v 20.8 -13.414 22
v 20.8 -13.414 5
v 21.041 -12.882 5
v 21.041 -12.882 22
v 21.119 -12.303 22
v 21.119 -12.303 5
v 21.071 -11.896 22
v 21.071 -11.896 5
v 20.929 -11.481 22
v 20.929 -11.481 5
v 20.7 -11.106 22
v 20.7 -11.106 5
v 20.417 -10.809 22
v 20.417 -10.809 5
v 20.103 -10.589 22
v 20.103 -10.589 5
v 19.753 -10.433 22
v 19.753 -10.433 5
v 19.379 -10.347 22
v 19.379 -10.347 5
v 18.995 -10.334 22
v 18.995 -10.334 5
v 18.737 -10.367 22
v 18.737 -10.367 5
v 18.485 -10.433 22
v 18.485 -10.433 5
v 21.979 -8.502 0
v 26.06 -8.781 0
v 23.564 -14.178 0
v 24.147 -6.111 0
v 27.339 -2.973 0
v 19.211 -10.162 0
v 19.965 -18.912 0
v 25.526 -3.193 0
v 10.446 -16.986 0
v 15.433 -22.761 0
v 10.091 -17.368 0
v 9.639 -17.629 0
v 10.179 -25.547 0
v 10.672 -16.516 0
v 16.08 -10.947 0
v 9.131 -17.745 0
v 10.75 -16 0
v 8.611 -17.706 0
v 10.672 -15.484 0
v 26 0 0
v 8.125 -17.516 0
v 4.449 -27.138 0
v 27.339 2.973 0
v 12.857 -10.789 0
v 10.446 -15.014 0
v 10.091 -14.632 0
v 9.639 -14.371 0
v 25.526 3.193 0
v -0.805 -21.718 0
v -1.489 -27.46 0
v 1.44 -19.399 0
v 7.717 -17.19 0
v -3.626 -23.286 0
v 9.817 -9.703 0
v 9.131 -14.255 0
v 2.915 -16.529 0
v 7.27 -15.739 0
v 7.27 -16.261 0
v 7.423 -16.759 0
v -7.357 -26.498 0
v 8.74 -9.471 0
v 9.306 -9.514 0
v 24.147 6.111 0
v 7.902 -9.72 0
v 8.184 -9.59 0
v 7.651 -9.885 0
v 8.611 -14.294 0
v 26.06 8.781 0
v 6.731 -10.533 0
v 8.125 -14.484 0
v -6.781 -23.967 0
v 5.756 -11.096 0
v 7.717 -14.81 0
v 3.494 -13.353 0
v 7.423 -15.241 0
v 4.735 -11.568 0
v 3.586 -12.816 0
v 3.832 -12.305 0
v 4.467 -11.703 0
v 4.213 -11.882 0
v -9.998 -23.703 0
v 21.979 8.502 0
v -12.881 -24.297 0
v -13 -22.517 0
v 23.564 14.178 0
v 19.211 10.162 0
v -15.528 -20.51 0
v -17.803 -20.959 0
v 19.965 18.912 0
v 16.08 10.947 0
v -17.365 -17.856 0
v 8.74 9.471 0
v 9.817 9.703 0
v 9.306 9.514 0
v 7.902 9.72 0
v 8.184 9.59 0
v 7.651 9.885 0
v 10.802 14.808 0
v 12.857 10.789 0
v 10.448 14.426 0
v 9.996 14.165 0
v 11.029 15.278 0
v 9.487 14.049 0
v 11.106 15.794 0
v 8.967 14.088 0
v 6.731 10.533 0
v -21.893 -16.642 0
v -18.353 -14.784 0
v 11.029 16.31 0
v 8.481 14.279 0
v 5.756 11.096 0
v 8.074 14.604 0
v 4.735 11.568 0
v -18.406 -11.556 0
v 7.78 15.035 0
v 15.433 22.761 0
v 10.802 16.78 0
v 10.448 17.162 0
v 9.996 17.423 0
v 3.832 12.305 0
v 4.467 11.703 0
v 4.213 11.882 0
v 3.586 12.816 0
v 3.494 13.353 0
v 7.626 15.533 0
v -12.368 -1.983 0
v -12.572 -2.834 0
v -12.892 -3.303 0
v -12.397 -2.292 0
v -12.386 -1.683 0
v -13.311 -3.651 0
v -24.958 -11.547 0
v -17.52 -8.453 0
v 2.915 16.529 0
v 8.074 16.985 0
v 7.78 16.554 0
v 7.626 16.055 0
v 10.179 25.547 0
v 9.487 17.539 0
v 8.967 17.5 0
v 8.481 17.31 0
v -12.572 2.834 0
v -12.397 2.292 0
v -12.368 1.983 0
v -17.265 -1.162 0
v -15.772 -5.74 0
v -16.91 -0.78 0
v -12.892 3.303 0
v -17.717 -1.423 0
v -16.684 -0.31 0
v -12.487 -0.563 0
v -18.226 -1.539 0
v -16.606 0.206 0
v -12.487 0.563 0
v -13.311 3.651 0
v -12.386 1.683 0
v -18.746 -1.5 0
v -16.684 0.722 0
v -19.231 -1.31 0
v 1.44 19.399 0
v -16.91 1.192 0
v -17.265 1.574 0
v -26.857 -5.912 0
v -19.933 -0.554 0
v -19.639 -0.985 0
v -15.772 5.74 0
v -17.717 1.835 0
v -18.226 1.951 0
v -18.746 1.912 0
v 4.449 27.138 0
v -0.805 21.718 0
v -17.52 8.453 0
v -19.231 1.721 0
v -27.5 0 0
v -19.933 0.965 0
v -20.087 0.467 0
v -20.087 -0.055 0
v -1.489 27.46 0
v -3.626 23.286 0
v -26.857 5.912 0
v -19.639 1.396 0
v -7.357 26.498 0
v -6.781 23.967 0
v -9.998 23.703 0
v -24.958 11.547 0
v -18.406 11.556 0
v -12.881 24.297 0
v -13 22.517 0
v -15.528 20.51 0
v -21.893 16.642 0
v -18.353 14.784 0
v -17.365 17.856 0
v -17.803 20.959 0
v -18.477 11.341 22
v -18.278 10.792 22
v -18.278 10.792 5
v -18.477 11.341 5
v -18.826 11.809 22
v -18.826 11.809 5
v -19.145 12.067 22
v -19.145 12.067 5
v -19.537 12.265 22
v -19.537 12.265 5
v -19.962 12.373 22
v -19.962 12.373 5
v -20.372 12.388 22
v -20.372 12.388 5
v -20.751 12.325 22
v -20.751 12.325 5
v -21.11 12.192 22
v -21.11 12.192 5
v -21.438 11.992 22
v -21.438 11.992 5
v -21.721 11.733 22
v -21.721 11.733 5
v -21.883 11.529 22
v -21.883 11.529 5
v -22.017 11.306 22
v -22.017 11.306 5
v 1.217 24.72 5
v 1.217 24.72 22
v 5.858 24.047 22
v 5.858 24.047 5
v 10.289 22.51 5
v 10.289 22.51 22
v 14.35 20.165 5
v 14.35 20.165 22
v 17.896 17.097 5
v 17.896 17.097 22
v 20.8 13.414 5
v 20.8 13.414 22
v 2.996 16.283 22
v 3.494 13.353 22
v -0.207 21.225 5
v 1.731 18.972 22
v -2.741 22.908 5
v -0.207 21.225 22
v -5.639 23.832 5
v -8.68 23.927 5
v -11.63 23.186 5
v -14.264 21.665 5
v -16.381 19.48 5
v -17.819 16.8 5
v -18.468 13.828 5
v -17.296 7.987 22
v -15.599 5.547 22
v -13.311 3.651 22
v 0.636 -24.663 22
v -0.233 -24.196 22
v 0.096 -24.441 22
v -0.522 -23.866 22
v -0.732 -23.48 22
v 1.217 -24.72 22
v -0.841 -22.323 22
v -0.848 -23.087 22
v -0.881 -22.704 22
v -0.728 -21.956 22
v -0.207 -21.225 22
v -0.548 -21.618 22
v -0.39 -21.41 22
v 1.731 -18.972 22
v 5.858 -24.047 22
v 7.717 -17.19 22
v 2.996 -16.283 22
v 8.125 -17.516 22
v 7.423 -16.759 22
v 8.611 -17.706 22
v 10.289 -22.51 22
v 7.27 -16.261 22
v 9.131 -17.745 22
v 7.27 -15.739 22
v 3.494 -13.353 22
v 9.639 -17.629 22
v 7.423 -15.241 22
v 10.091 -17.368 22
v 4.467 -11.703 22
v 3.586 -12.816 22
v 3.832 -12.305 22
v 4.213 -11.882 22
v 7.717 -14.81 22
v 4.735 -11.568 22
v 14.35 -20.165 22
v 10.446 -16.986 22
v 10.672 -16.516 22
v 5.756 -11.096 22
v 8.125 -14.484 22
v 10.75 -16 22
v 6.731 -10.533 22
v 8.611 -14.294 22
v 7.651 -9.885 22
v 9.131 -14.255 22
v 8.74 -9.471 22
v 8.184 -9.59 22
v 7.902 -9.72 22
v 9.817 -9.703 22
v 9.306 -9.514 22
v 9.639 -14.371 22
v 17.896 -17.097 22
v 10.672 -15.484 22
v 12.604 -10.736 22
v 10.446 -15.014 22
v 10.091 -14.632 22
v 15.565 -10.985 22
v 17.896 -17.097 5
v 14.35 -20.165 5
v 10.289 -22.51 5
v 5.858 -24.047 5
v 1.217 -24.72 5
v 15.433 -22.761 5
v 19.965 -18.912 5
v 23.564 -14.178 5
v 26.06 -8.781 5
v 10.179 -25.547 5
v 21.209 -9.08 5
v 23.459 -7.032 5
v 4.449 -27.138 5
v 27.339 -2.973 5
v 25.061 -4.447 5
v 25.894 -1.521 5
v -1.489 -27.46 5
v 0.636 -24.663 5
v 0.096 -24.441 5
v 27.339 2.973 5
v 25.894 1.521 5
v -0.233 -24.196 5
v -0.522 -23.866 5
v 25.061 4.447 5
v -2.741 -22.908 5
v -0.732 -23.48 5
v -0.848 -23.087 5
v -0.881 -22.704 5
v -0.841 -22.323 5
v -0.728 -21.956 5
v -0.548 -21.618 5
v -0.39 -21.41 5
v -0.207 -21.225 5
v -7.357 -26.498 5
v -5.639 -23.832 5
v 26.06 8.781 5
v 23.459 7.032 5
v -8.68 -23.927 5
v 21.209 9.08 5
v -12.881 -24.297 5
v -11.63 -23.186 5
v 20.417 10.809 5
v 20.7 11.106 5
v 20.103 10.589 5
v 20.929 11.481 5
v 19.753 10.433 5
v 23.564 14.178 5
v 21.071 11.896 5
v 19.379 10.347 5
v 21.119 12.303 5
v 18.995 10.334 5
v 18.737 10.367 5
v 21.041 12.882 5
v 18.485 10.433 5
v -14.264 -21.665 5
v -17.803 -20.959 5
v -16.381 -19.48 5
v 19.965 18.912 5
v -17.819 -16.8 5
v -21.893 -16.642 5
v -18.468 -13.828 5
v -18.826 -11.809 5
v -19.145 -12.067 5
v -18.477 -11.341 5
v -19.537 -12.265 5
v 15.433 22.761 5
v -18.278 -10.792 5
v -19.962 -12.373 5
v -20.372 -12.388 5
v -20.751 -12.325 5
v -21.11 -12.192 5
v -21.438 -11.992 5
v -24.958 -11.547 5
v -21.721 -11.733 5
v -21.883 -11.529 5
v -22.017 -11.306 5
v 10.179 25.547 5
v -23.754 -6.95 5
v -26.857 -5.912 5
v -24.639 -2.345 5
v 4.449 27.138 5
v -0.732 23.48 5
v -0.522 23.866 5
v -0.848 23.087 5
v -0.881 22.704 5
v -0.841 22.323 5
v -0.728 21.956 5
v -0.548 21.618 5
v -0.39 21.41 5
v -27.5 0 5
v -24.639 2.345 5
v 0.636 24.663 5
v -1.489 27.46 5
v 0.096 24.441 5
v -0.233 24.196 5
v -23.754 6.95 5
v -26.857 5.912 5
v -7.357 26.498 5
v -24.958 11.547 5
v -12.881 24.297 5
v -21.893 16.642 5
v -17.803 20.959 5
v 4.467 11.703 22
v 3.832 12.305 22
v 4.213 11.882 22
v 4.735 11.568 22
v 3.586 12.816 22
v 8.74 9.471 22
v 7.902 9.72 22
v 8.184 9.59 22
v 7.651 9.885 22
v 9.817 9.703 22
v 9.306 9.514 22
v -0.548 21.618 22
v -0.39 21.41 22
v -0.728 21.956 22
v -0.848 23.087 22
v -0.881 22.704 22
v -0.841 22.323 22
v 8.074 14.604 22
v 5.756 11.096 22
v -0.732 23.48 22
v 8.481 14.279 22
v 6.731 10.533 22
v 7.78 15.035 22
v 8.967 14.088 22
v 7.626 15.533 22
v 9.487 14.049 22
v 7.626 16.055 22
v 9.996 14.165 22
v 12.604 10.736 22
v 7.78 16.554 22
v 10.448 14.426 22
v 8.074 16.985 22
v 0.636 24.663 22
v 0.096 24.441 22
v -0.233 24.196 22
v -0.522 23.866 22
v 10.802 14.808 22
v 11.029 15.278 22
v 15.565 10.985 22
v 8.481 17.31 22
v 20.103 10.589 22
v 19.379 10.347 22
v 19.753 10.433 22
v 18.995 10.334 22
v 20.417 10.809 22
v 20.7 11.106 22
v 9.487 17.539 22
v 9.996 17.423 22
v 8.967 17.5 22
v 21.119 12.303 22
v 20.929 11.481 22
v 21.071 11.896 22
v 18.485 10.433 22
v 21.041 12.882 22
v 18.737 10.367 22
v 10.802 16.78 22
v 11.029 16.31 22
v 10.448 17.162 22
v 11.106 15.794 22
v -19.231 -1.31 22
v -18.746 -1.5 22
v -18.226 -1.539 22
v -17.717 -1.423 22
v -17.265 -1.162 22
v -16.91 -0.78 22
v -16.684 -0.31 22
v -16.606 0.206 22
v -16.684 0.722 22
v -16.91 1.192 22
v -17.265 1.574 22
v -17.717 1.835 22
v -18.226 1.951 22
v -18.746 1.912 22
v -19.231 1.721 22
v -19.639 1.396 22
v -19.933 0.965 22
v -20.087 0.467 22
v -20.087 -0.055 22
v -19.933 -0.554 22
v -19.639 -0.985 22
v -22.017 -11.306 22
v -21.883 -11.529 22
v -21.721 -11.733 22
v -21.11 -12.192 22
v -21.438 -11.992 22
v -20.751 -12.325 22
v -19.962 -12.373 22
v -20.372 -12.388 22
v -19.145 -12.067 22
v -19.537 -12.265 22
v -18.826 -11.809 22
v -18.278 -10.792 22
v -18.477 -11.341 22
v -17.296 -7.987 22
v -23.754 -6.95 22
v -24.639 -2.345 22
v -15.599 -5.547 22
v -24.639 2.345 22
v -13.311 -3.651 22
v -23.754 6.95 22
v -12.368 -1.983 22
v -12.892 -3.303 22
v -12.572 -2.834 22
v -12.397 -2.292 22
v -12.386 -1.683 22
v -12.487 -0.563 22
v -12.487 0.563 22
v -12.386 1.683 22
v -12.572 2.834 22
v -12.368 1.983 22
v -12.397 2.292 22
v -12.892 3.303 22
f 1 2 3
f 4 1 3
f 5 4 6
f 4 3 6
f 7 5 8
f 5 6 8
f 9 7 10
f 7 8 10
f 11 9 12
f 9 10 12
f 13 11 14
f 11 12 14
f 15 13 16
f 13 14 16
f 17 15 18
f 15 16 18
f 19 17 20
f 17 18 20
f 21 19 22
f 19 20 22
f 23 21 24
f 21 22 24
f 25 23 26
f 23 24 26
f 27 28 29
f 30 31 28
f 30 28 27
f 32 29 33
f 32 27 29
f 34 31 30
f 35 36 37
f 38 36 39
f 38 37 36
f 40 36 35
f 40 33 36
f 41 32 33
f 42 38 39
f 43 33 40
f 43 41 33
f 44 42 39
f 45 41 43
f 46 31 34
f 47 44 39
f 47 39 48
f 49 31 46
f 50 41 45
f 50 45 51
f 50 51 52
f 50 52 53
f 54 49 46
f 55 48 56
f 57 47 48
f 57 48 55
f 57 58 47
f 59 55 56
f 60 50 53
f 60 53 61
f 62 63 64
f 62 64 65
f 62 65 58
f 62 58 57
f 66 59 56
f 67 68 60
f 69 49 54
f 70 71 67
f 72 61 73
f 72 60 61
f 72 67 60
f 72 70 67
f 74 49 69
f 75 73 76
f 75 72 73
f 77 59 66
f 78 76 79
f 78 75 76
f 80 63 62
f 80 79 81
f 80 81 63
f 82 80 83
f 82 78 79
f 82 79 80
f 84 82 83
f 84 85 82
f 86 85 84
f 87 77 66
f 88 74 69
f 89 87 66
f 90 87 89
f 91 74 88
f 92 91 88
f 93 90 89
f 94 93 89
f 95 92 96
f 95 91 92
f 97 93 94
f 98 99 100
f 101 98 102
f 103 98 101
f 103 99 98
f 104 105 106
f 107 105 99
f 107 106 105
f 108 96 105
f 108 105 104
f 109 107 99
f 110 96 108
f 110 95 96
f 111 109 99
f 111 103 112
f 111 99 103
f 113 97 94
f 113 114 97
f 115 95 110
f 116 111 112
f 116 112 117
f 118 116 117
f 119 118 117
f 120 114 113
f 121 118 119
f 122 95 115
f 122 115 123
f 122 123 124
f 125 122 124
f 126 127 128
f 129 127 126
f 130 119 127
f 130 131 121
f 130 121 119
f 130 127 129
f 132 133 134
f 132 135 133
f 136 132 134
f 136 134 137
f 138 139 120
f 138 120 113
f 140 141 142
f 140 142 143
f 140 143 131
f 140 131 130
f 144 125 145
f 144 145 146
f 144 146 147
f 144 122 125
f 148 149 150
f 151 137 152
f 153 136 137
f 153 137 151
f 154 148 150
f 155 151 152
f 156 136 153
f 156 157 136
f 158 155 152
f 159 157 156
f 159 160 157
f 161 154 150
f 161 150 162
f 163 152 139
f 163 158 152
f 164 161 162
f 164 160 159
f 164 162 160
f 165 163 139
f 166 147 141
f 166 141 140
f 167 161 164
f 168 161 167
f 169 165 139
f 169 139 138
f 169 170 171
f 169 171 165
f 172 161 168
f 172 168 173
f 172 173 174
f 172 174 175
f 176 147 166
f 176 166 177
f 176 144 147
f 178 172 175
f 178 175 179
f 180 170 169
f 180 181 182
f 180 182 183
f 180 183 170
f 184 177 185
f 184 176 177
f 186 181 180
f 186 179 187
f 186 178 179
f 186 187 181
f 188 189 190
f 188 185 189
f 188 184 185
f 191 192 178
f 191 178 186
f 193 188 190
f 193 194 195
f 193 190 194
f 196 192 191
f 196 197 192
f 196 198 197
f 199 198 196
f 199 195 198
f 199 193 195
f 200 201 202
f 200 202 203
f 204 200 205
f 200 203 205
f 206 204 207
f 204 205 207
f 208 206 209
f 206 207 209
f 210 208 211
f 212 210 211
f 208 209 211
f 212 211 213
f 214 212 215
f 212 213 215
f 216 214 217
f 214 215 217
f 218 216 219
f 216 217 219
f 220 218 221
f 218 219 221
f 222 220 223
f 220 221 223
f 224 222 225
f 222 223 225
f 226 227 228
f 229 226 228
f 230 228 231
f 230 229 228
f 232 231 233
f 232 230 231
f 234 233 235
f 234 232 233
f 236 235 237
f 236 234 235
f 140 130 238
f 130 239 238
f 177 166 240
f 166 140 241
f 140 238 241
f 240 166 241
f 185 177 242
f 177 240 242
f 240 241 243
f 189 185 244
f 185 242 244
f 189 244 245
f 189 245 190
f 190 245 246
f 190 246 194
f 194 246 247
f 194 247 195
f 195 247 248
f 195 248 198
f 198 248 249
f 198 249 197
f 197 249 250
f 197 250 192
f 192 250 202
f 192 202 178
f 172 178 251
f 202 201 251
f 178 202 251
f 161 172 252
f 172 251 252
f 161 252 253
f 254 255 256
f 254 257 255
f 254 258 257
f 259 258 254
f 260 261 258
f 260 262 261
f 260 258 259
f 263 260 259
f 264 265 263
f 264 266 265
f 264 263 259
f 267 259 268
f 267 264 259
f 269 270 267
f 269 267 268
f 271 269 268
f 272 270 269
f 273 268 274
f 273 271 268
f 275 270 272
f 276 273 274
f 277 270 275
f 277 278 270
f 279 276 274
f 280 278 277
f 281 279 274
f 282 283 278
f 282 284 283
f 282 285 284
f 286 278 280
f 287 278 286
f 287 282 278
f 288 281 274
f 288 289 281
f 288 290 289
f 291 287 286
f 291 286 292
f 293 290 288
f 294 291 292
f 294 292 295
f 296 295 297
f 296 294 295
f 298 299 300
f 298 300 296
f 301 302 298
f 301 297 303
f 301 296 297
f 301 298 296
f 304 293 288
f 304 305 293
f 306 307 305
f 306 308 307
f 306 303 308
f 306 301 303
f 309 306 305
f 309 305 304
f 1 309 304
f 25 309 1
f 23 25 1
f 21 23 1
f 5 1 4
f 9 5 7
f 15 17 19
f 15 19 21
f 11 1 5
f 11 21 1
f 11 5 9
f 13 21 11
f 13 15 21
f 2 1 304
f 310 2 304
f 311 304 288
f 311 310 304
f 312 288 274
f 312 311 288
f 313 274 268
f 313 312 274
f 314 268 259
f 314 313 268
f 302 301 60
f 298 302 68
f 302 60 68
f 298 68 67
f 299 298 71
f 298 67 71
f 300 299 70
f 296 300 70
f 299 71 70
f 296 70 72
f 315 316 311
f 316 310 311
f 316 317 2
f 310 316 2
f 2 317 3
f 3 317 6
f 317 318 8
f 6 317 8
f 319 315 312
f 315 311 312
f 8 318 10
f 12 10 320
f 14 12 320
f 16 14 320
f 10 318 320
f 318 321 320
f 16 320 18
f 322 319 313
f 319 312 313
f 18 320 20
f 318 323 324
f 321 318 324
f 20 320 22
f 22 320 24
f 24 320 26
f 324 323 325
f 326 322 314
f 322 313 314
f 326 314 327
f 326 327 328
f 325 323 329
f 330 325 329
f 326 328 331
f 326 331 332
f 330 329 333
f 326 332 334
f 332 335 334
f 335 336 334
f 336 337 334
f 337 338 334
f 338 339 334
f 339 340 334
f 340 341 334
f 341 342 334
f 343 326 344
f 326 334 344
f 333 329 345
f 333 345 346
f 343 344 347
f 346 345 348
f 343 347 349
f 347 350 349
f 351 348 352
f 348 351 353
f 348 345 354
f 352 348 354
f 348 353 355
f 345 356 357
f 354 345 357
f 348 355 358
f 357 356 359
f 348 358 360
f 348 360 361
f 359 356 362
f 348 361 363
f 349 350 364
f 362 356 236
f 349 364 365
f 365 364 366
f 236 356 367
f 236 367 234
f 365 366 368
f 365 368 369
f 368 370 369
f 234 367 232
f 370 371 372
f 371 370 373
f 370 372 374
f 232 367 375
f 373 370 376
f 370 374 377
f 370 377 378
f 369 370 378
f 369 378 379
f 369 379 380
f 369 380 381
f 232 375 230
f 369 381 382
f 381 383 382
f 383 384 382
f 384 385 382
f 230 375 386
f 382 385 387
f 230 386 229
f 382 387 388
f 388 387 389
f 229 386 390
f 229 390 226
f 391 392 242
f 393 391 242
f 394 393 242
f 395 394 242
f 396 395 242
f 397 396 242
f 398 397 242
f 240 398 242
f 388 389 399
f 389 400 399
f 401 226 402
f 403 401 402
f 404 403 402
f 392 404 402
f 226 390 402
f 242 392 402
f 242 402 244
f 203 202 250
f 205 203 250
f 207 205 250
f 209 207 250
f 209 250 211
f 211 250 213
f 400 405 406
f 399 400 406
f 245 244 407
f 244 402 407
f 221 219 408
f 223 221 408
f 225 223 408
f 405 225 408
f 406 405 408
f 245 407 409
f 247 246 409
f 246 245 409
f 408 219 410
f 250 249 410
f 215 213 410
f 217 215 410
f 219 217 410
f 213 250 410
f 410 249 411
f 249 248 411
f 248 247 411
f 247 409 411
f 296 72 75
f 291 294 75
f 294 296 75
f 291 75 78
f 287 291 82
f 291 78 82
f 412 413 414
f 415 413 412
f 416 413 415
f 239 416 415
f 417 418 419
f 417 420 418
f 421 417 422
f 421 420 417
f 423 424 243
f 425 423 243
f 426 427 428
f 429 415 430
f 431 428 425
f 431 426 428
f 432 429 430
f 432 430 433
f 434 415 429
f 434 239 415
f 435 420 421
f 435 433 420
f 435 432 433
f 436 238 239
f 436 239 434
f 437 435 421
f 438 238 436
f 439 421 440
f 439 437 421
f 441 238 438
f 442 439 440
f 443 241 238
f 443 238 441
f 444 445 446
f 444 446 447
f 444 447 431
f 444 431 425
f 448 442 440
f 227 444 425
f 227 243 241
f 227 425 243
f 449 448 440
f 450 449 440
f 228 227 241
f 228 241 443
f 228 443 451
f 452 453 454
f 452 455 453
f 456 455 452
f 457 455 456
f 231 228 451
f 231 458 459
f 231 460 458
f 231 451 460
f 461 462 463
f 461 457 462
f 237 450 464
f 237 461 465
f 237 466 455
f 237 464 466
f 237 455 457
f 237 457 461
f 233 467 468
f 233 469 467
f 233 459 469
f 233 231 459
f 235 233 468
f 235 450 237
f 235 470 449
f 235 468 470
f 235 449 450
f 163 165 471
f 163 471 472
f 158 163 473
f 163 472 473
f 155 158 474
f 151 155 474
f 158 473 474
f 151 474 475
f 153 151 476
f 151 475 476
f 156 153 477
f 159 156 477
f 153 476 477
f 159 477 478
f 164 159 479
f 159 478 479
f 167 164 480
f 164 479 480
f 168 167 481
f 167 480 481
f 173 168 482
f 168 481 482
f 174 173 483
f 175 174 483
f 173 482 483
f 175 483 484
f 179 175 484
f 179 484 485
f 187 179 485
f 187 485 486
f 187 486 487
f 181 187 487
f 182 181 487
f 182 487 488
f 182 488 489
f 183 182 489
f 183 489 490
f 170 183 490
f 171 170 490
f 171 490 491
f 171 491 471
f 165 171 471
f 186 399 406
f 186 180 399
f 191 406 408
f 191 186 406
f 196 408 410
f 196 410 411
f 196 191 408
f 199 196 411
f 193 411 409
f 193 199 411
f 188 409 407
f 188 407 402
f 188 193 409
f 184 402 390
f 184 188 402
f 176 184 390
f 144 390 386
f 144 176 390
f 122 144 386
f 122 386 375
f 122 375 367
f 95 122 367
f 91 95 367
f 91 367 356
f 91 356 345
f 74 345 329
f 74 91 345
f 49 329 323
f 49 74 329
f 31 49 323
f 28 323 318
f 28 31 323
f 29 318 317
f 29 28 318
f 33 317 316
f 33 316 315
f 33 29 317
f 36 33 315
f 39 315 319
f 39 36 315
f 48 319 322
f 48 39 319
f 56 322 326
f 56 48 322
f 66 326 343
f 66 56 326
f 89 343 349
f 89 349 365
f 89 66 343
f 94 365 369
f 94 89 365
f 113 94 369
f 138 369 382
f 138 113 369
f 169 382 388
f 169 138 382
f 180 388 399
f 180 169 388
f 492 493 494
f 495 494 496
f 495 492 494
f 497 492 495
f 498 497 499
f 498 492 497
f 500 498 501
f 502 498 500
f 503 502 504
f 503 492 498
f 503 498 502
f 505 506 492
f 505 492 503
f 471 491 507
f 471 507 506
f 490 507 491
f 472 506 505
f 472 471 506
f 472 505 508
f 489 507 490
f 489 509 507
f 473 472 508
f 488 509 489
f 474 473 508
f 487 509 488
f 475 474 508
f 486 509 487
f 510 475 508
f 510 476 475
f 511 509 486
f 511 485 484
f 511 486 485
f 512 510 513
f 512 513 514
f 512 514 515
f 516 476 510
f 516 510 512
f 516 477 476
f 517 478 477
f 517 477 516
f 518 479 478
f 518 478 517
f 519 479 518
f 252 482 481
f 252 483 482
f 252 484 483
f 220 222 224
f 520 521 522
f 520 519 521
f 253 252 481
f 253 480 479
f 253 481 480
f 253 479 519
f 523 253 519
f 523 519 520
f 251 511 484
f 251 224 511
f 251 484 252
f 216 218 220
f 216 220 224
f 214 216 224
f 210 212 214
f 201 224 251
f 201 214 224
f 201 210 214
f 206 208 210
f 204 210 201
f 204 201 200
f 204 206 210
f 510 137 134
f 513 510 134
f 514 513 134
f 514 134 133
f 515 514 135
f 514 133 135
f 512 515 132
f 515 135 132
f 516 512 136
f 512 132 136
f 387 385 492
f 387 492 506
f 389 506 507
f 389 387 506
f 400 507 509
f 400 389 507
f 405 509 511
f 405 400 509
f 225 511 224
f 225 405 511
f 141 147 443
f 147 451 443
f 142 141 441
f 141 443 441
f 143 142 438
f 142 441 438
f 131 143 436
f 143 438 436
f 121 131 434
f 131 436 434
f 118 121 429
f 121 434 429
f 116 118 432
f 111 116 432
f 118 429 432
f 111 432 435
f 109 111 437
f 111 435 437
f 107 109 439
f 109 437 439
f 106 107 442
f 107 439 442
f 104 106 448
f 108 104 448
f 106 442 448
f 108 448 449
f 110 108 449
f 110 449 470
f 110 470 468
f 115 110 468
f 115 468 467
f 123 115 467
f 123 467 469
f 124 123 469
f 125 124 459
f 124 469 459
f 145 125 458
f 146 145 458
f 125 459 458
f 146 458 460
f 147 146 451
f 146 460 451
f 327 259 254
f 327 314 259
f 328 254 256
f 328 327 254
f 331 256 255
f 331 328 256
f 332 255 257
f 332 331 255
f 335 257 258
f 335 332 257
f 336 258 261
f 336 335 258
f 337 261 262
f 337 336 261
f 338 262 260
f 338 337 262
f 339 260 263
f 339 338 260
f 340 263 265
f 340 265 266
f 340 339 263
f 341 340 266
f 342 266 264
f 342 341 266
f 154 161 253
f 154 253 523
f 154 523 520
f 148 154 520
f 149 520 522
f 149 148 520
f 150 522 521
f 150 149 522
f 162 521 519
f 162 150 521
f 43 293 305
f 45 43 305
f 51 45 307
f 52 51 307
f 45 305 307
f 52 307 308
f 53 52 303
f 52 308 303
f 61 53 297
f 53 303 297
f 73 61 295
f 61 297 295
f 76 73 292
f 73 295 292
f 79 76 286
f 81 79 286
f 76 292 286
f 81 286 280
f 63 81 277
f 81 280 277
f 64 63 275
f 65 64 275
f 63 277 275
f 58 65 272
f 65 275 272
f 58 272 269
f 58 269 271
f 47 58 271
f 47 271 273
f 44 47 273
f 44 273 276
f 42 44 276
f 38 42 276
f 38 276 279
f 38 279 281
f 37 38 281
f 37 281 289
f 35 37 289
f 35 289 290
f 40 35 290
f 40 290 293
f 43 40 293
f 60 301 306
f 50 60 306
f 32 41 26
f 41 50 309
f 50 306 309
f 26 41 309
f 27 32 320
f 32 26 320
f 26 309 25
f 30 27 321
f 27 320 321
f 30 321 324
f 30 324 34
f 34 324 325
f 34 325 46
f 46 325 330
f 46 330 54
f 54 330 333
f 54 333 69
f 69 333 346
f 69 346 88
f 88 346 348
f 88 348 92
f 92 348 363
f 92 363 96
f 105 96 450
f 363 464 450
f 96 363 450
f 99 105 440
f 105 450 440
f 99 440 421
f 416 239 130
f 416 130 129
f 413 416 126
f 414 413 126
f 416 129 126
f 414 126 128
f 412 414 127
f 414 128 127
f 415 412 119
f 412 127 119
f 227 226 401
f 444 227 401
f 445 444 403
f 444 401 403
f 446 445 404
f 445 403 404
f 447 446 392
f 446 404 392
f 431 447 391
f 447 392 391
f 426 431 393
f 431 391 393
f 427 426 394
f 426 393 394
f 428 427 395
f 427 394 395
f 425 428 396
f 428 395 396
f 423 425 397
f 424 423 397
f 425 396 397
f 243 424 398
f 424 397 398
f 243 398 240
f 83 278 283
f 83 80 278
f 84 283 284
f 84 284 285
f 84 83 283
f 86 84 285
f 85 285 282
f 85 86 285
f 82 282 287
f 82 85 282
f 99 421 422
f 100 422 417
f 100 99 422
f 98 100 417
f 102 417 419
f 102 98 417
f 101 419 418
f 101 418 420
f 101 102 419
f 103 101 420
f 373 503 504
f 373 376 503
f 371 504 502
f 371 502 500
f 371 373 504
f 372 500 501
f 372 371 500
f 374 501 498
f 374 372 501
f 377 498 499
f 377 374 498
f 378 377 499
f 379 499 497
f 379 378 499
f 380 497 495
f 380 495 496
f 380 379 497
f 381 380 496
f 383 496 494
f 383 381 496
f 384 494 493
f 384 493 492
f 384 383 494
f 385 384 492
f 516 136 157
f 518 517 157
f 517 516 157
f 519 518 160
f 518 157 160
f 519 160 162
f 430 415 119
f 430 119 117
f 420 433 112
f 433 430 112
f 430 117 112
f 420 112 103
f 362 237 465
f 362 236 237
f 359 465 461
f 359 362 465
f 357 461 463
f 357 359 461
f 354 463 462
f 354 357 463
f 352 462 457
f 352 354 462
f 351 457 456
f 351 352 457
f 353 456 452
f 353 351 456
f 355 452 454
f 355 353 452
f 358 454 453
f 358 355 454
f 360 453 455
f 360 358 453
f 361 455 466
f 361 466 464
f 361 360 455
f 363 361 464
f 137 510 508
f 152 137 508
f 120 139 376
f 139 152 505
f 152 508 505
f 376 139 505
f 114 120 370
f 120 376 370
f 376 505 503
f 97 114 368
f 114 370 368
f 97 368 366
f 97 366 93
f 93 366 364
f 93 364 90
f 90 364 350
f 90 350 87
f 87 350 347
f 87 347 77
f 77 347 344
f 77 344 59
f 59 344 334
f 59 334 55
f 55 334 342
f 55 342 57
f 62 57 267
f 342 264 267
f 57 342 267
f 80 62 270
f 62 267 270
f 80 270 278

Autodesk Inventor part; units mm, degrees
ref_plane "YZ Plane" through (0, 0, 0) normal (1, 0, 0) x (0, 1, 0)
ref_plane "XZ Plane" through (0, 0, 0) normal (0, 1, 0) x (-1, 0, 0)
ref_plane "XY Plane" through (0, 0, 0) normal (0, 0, 1) x (1, 0, 0)
sketch "Sketch1" plane through (0, 0, 0) normal (0, 0, 1) x (1, 0, 0)
  circle A0 centre (0, 0) radius 24.75
  circle A1 centre (0, 0) radius 12.5
  dimension "d0" = 49.5
  dimension "d1" = 25
extrude "Extrusion1" add sketch "Sketch1" along normal blind 22
sketch "Sketch3" plane through (0, 0, 0) normal (0, 0, -1) x (-1, 0, 0)
  circle A0 centre (0, 0) radius 24.75
  circle A1 centre (0, 0) radius 27.5
  dimension "d13" = 49.5
  dimension "d14" = 55
extrude "Extrusion3" add sketch "Sketch3" against normal blind 5
sketch "Sketch2" plane through (0, 0, 22) normal (0, 0, 1) x (1, 0, 0)
  circle A0 centre (15, 0) radius 11
  point P0 (0, 0)
  dimension "d4" = 15
  dimension "d5" = 0
  dimension "d6" = 22
extrude "Extrusion2" cut sketch "Sketch2" against normal blind 22
fillet "Fillet1" radius 2 4 edges at (8.675, 8.9997, 11) (8.675, -8.9997, 11) (23.8854, -6.4845, 13.5) (23.8854, 6.4845, 13.5)
pattern_circular "Circular Pattern1" count 3 over 360 about axis through (0, 0, 0) along (0, 0, 1) of "Extrusion2", "Fillet1"
sketch "Sketch4" plane through (0, 0, 22) normal (0, 0, 1) x (1, 0, 0)
  circle A0 centre (9, -16) radius 1.75
  point P0 (0, 0)
  dimension "d17" = 3.5
  dimension "d18" = 16
  dimension "d19" = 9
extrude "Extrusion4" cut sketch "Sketch4" against normal through all
pattern_circular "Circular Pattern2" count 3 over 360 about axis through (0, 0, 0) along (0, 0, 1) of "Extrusion4"
properties part number "LayerBase2"
